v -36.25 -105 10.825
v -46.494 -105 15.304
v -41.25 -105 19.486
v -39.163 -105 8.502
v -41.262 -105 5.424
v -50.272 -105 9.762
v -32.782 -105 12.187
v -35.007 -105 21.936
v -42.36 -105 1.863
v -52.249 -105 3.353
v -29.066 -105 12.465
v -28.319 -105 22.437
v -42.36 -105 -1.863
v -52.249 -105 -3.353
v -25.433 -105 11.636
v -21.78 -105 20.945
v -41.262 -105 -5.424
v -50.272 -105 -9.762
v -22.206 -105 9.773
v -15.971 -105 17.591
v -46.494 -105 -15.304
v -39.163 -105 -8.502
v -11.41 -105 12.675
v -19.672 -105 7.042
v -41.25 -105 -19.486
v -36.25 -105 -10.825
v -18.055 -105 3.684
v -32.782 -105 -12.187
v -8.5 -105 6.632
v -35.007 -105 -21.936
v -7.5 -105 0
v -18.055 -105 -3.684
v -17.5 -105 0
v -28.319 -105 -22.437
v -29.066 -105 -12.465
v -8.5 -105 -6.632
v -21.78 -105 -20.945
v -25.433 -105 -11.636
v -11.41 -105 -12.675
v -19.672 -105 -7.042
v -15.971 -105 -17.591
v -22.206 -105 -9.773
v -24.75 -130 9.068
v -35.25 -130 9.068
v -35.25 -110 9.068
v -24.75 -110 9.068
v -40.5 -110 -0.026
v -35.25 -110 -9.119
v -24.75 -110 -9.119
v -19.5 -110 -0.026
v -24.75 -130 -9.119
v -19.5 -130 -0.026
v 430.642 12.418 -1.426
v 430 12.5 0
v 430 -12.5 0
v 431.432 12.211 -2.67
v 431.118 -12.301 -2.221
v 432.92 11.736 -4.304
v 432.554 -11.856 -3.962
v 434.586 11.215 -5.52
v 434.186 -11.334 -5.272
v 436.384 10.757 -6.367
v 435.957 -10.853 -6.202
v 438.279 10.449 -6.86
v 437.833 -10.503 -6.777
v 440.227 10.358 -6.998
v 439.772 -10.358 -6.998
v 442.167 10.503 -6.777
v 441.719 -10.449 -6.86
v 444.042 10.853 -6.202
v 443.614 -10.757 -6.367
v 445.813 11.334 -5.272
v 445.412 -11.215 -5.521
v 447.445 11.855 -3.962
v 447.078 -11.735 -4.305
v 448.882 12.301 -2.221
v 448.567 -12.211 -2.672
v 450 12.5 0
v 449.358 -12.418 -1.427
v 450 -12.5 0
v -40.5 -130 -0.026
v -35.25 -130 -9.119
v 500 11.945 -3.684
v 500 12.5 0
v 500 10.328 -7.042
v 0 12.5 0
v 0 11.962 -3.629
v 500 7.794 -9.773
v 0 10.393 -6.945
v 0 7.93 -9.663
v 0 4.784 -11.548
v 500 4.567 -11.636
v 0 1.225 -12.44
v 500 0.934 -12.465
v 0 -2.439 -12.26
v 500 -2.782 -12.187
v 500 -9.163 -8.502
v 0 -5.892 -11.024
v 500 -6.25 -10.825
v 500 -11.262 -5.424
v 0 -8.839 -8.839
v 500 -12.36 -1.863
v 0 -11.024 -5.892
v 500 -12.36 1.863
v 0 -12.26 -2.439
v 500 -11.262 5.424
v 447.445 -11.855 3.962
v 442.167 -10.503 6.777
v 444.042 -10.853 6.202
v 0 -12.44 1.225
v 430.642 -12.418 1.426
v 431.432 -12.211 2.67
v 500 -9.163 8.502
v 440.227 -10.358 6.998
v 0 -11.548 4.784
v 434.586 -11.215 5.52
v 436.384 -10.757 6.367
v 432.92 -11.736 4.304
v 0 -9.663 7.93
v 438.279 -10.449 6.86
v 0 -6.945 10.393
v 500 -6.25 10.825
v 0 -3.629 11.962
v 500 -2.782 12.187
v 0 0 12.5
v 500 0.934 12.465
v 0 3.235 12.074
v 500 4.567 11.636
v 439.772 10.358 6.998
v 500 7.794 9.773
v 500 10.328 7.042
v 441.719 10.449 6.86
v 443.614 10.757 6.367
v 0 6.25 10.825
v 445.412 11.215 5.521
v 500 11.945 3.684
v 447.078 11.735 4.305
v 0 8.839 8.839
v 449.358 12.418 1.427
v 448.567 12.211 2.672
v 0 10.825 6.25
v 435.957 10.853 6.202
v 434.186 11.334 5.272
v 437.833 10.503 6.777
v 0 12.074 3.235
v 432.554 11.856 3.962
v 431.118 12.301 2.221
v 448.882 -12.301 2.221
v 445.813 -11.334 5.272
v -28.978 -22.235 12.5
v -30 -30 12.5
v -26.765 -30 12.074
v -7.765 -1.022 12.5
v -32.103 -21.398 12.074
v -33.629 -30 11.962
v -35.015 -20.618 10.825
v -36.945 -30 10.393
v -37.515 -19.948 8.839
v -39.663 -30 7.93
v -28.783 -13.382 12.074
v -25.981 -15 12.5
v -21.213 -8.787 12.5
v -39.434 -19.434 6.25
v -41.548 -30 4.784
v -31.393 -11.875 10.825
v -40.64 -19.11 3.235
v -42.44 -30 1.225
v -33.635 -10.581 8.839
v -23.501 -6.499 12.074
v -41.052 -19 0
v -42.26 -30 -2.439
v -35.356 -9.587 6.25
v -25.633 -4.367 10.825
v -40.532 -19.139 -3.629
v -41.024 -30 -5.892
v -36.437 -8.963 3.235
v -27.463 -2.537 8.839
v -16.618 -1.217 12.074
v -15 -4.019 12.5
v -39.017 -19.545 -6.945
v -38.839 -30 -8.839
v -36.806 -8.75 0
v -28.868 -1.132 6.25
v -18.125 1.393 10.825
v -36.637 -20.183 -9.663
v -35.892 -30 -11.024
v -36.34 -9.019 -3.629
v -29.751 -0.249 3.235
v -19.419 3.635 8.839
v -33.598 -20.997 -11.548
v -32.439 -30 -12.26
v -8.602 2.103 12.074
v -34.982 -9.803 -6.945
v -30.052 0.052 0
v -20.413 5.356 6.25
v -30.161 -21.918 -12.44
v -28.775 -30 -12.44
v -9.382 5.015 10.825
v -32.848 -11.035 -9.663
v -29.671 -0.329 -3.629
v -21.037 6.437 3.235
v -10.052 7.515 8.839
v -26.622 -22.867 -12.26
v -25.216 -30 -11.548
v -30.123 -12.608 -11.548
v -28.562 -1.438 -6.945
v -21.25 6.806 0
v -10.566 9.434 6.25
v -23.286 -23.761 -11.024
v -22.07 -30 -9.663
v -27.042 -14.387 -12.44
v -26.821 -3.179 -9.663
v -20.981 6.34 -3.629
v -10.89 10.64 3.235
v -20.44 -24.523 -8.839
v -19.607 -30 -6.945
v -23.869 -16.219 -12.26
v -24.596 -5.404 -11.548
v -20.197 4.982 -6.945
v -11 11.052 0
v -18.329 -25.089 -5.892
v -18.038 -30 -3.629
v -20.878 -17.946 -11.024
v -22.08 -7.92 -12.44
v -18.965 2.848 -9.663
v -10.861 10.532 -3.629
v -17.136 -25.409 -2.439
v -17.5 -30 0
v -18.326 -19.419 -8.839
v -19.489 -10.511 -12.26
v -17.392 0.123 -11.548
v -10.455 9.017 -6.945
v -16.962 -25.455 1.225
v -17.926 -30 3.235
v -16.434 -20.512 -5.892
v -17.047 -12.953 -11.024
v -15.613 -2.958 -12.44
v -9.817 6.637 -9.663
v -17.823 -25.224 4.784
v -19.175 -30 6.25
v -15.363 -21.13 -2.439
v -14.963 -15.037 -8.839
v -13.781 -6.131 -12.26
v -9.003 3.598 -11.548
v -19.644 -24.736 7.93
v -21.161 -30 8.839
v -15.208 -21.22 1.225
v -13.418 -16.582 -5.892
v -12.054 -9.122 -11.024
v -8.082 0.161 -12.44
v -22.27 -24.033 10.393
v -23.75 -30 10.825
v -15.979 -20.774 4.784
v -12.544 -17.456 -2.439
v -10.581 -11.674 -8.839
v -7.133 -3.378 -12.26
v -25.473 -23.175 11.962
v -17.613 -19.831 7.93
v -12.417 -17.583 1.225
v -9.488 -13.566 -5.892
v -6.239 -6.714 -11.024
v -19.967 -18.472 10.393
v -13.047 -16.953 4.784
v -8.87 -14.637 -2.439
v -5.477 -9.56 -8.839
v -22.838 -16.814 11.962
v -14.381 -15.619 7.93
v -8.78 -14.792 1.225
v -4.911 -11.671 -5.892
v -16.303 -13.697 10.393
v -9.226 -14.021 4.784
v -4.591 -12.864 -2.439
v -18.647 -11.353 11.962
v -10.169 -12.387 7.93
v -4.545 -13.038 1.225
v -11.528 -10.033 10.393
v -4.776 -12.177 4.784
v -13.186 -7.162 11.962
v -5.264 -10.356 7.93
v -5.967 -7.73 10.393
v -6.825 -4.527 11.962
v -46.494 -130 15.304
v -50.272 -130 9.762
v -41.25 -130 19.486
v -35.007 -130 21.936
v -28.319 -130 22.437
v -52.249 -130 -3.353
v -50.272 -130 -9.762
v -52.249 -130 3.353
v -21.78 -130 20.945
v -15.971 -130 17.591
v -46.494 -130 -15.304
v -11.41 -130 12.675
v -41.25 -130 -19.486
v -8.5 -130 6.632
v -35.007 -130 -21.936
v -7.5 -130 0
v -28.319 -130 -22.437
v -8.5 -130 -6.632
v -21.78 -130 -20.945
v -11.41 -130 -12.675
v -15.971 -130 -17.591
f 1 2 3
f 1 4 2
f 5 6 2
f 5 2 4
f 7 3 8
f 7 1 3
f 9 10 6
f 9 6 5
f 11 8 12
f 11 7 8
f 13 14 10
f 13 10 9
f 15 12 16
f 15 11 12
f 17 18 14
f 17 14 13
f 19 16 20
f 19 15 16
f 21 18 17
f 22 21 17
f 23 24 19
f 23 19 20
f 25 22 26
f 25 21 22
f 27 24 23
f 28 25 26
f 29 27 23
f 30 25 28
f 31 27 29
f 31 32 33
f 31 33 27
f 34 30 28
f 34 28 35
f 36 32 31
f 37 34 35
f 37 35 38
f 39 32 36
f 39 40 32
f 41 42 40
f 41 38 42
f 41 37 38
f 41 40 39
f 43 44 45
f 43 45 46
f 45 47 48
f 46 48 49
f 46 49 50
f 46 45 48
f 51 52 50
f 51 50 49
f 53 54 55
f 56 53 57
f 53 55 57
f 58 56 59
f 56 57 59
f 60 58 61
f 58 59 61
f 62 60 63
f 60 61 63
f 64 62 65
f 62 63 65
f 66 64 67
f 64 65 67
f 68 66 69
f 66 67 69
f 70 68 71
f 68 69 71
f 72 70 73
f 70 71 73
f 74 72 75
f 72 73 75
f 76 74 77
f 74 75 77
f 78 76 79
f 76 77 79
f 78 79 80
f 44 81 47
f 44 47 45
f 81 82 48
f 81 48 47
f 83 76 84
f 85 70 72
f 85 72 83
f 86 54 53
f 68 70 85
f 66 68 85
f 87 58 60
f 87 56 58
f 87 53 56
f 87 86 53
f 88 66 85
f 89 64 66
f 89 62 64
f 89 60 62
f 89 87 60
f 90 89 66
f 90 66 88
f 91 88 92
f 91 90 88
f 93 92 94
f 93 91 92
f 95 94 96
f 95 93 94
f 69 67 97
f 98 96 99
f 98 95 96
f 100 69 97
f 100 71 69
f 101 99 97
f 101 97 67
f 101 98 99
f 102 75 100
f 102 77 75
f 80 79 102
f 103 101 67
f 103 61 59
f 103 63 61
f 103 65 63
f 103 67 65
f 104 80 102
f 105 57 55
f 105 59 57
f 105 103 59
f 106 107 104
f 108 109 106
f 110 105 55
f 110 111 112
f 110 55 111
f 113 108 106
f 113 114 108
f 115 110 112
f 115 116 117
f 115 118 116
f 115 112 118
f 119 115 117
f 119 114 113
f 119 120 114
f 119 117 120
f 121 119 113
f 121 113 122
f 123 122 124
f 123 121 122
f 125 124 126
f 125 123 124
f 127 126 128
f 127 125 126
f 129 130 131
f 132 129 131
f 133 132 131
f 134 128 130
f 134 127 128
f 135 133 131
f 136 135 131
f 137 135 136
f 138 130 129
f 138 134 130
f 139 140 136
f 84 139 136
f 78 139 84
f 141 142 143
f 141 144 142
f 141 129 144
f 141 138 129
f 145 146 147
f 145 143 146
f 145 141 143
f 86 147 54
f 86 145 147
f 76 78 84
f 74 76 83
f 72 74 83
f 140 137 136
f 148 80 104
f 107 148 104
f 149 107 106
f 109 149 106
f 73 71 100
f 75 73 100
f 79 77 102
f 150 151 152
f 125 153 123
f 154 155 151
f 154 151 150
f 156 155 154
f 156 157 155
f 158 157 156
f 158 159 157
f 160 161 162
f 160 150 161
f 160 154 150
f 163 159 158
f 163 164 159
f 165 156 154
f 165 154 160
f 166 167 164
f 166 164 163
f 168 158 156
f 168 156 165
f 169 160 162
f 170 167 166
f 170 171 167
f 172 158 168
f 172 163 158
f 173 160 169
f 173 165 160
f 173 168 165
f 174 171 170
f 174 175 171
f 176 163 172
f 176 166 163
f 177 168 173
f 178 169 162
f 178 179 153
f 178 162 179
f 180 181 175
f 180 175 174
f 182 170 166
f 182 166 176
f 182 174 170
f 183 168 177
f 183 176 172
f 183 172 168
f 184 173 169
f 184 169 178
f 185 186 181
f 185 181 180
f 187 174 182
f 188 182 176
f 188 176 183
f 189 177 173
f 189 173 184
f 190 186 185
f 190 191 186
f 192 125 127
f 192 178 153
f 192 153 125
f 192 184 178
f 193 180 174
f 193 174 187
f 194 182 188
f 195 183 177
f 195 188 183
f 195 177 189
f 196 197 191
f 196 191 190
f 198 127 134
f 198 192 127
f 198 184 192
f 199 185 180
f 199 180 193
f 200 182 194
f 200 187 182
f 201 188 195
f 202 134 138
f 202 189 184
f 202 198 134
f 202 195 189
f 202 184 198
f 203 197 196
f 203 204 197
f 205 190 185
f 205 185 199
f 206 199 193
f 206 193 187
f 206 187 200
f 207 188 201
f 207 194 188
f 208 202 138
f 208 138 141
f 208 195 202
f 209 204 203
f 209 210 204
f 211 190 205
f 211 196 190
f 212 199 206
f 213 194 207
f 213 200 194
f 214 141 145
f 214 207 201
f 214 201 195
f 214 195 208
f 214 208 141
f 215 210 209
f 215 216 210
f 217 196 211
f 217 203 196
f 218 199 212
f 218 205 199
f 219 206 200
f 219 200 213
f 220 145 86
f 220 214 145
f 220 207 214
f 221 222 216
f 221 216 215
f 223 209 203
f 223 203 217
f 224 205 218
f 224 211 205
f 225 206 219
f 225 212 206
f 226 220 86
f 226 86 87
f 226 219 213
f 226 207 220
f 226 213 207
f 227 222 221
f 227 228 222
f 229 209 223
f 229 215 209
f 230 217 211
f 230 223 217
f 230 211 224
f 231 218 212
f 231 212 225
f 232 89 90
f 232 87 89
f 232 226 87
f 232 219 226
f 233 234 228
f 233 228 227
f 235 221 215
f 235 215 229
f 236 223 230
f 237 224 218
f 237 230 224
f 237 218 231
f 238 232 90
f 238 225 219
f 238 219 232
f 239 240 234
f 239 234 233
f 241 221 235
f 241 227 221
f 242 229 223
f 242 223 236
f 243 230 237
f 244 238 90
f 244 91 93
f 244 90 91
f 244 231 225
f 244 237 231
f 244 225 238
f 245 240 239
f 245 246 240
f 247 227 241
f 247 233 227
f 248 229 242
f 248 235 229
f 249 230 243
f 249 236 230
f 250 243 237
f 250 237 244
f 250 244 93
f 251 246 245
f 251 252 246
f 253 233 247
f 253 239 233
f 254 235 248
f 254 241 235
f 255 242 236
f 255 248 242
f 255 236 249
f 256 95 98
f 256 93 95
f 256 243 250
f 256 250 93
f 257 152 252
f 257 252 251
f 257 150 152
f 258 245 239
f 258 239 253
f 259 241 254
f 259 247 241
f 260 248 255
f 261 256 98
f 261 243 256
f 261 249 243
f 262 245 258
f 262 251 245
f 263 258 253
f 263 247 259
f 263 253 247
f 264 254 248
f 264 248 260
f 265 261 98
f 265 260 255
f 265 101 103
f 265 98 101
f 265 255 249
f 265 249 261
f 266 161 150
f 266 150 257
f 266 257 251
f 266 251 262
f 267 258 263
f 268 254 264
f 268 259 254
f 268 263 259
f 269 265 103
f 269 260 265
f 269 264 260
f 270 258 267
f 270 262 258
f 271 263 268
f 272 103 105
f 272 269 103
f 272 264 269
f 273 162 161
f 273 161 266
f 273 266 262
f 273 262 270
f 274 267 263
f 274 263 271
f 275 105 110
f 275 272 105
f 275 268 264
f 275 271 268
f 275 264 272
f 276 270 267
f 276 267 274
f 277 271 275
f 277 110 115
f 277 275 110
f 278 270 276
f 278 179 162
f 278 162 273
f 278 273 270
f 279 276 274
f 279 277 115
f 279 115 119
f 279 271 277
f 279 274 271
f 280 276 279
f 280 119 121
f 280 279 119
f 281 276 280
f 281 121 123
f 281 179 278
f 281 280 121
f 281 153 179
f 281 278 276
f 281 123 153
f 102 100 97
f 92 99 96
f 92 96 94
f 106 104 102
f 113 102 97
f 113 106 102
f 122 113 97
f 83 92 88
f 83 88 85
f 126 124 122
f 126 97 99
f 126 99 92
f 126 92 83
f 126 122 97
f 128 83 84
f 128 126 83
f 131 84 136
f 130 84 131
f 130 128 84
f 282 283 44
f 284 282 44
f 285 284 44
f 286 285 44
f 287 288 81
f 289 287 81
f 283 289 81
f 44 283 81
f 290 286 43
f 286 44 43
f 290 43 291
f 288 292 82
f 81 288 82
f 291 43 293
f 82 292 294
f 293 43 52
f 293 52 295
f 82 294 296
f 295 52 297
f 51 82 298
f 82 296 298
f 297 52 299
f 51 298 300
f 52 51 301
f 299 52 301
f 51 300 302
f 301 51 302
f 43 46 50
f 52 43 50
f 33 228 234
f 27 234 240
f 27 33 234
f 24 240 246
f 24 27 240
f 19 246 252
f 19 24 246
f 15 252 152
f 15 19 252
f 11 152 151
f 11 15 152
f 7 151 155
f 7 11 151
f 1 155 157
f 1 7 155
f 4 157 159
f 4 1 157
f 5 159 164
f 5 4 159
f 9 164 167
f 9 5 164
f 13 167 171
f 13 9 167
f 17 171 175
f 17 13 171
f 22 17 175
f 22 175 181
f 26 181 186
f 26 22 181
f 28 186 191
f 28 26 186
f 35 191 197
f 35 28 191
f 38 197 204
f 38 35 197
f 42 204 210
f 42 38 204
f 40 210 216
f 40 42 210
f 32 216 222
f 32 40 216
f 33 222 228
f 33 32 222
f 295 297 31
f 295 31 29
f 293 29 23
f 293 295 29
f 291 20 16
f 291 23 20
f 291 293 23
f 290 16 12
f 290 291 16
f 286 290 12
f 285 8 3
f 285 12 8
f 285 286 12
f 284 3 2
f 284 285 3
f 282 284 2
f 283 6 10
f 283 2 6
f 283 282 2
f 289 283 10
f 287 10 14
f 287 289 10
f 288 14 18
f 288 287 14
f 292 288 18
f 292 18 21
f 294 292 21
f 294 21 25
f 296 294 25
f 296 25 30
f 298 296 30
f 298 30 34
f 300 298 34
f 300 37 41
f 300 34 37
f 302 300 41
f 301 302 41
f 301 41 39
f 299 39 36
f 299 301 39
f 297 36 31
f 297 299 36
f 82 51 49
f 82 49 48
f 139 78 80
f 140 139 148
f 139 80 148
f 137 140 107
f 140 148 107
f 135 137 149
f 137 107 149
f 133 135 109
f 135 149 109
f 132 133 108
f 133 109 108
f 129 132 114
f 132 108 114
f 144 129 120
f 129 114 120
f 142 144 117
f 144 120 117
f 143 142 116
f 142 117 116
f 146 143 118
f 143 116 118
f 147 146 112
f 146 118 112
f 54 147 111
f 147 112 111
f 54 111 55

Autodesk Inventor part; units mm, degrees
ref_plane "YZ Plane" through (0, 0, 0) normal (1, 0, 0) x (0, 1, 0)
ref_plane "XZ Plane" through (0, 0, 0) normal (0, 1, 0) x (-1, 0, 0)
ref_plane "XY Plane" through (0, 0, 0) normal (0, 0, 1) x (1, 0, 0)
sketch "Sketch1" plane through (0, 0, 0) normal (0, 1, 0) x (-1, 0, 0)
  arc A0 (-450, 0) -> (-430, 0) centre (-440, 3.6429) ccw
  arc A1 (-430, 0) -> (-450, 0) centre (-440, -3.6429) ccw
sketch "Sketch2" plane through (0, 0, 0) normal (1, 0, 0) x (0, 1, 0)
  circle A0 centre (0, 0) radius 12.5
  dimension "d8" = 25
extrude "Extrusion1" add sketch "Sketch2" along normal blind 500
extrude "Extrusion2" cut sketch "Sketch1" along normal mid plane 25
sketch "Sketch3" plane through (0, 0, 0) normal (0, 0, 1) x (1, 0, 0)
  line L0 (0, -12.5) -> (0, 12.5) projected
  line L1 (0, -30) -> (-42.5, -30) construction
  line L2 (0, -30) -> (0, 12.5) construction
  line L3 (-17.5, -30) -> (-17.5, -105)
  line L4 (-17.5, -105) -> (-7.5, -105)
  line L5 (-7.5, -105) -> (-7.5, -130)
  line L6 (-7.5, -130) -> (-30, -130)
  line L7 (-30, -130) -> (-30, -30)
  line L8 (-17.5, -30) -> (-30, -30)
  point P0 (0, 0)
  point P1 (0, 0)
  dimension "d13" = 90
  dimension "d14" = 30
  dimension "d15" = 75
  dimension "d16" = 10
  dimension "d17" = 25
  dimension "d18" = 22.5
revolve "Revolution1" add sketch "Sketch3" angle 360 about axis through (-30, -130, 0) along (0, 1, 0)
sketch "Sketch5" plane through (0, 0, 0) normal (-1, 0, 0) x (0, 0, 1)
  circle A0 centre (0, 0) radius 12.5
  line L0 (12.5, -30) -> (-12.5, -30) projected
  line L1 (12.5, -30) -> (-12.5, -30)
revolve "Revolution2" add sketch "Sketch5" angle 90 about axis through (0, -30, 12.5) along (0, 0, 1)
sketch "Sketch6" plane through (-30, -130, 0) normal (0, -1, 0) x (1, 0, 0)
  line L0 (-10.5, -0.0258) -> (-5.25, 9.0675)
  line L1 (-5.25, 9.0675) -> (5.25, 9.0675)
  line L2 (5.25, 9.0675) -> (10.5, -0.0258)
  line L3 (10.5, -0.0258) -> (5.25, -9.119)
  line L4 (5.25, -9.119) -> (-5.25, -9.119)
  line L5 (-5.25, -9.119) -> (-10.5, -0.0258)
  circle A0 centre (0, 0) radius 22.5 projected
  point P0 (30, 0)
  point P1 (0, 9.0675)
  dimension "d24" = 120
  dimension "d25" = 21
  dimension "d26" = 120
  dimension "d27" = 120
  dimension "d28" = 0
  dimension "d29" = 120
  dimension "d30" = 0
  dimension "d31" = 10.5
  dimension "d32" = 10.5
extrude "Extrusion3" cut sketch "Sketch6" against normal blind 20 contours L0 L1 L2 L3 L4 L5
properties part number "Chave" material "Steel ASTM A36"
